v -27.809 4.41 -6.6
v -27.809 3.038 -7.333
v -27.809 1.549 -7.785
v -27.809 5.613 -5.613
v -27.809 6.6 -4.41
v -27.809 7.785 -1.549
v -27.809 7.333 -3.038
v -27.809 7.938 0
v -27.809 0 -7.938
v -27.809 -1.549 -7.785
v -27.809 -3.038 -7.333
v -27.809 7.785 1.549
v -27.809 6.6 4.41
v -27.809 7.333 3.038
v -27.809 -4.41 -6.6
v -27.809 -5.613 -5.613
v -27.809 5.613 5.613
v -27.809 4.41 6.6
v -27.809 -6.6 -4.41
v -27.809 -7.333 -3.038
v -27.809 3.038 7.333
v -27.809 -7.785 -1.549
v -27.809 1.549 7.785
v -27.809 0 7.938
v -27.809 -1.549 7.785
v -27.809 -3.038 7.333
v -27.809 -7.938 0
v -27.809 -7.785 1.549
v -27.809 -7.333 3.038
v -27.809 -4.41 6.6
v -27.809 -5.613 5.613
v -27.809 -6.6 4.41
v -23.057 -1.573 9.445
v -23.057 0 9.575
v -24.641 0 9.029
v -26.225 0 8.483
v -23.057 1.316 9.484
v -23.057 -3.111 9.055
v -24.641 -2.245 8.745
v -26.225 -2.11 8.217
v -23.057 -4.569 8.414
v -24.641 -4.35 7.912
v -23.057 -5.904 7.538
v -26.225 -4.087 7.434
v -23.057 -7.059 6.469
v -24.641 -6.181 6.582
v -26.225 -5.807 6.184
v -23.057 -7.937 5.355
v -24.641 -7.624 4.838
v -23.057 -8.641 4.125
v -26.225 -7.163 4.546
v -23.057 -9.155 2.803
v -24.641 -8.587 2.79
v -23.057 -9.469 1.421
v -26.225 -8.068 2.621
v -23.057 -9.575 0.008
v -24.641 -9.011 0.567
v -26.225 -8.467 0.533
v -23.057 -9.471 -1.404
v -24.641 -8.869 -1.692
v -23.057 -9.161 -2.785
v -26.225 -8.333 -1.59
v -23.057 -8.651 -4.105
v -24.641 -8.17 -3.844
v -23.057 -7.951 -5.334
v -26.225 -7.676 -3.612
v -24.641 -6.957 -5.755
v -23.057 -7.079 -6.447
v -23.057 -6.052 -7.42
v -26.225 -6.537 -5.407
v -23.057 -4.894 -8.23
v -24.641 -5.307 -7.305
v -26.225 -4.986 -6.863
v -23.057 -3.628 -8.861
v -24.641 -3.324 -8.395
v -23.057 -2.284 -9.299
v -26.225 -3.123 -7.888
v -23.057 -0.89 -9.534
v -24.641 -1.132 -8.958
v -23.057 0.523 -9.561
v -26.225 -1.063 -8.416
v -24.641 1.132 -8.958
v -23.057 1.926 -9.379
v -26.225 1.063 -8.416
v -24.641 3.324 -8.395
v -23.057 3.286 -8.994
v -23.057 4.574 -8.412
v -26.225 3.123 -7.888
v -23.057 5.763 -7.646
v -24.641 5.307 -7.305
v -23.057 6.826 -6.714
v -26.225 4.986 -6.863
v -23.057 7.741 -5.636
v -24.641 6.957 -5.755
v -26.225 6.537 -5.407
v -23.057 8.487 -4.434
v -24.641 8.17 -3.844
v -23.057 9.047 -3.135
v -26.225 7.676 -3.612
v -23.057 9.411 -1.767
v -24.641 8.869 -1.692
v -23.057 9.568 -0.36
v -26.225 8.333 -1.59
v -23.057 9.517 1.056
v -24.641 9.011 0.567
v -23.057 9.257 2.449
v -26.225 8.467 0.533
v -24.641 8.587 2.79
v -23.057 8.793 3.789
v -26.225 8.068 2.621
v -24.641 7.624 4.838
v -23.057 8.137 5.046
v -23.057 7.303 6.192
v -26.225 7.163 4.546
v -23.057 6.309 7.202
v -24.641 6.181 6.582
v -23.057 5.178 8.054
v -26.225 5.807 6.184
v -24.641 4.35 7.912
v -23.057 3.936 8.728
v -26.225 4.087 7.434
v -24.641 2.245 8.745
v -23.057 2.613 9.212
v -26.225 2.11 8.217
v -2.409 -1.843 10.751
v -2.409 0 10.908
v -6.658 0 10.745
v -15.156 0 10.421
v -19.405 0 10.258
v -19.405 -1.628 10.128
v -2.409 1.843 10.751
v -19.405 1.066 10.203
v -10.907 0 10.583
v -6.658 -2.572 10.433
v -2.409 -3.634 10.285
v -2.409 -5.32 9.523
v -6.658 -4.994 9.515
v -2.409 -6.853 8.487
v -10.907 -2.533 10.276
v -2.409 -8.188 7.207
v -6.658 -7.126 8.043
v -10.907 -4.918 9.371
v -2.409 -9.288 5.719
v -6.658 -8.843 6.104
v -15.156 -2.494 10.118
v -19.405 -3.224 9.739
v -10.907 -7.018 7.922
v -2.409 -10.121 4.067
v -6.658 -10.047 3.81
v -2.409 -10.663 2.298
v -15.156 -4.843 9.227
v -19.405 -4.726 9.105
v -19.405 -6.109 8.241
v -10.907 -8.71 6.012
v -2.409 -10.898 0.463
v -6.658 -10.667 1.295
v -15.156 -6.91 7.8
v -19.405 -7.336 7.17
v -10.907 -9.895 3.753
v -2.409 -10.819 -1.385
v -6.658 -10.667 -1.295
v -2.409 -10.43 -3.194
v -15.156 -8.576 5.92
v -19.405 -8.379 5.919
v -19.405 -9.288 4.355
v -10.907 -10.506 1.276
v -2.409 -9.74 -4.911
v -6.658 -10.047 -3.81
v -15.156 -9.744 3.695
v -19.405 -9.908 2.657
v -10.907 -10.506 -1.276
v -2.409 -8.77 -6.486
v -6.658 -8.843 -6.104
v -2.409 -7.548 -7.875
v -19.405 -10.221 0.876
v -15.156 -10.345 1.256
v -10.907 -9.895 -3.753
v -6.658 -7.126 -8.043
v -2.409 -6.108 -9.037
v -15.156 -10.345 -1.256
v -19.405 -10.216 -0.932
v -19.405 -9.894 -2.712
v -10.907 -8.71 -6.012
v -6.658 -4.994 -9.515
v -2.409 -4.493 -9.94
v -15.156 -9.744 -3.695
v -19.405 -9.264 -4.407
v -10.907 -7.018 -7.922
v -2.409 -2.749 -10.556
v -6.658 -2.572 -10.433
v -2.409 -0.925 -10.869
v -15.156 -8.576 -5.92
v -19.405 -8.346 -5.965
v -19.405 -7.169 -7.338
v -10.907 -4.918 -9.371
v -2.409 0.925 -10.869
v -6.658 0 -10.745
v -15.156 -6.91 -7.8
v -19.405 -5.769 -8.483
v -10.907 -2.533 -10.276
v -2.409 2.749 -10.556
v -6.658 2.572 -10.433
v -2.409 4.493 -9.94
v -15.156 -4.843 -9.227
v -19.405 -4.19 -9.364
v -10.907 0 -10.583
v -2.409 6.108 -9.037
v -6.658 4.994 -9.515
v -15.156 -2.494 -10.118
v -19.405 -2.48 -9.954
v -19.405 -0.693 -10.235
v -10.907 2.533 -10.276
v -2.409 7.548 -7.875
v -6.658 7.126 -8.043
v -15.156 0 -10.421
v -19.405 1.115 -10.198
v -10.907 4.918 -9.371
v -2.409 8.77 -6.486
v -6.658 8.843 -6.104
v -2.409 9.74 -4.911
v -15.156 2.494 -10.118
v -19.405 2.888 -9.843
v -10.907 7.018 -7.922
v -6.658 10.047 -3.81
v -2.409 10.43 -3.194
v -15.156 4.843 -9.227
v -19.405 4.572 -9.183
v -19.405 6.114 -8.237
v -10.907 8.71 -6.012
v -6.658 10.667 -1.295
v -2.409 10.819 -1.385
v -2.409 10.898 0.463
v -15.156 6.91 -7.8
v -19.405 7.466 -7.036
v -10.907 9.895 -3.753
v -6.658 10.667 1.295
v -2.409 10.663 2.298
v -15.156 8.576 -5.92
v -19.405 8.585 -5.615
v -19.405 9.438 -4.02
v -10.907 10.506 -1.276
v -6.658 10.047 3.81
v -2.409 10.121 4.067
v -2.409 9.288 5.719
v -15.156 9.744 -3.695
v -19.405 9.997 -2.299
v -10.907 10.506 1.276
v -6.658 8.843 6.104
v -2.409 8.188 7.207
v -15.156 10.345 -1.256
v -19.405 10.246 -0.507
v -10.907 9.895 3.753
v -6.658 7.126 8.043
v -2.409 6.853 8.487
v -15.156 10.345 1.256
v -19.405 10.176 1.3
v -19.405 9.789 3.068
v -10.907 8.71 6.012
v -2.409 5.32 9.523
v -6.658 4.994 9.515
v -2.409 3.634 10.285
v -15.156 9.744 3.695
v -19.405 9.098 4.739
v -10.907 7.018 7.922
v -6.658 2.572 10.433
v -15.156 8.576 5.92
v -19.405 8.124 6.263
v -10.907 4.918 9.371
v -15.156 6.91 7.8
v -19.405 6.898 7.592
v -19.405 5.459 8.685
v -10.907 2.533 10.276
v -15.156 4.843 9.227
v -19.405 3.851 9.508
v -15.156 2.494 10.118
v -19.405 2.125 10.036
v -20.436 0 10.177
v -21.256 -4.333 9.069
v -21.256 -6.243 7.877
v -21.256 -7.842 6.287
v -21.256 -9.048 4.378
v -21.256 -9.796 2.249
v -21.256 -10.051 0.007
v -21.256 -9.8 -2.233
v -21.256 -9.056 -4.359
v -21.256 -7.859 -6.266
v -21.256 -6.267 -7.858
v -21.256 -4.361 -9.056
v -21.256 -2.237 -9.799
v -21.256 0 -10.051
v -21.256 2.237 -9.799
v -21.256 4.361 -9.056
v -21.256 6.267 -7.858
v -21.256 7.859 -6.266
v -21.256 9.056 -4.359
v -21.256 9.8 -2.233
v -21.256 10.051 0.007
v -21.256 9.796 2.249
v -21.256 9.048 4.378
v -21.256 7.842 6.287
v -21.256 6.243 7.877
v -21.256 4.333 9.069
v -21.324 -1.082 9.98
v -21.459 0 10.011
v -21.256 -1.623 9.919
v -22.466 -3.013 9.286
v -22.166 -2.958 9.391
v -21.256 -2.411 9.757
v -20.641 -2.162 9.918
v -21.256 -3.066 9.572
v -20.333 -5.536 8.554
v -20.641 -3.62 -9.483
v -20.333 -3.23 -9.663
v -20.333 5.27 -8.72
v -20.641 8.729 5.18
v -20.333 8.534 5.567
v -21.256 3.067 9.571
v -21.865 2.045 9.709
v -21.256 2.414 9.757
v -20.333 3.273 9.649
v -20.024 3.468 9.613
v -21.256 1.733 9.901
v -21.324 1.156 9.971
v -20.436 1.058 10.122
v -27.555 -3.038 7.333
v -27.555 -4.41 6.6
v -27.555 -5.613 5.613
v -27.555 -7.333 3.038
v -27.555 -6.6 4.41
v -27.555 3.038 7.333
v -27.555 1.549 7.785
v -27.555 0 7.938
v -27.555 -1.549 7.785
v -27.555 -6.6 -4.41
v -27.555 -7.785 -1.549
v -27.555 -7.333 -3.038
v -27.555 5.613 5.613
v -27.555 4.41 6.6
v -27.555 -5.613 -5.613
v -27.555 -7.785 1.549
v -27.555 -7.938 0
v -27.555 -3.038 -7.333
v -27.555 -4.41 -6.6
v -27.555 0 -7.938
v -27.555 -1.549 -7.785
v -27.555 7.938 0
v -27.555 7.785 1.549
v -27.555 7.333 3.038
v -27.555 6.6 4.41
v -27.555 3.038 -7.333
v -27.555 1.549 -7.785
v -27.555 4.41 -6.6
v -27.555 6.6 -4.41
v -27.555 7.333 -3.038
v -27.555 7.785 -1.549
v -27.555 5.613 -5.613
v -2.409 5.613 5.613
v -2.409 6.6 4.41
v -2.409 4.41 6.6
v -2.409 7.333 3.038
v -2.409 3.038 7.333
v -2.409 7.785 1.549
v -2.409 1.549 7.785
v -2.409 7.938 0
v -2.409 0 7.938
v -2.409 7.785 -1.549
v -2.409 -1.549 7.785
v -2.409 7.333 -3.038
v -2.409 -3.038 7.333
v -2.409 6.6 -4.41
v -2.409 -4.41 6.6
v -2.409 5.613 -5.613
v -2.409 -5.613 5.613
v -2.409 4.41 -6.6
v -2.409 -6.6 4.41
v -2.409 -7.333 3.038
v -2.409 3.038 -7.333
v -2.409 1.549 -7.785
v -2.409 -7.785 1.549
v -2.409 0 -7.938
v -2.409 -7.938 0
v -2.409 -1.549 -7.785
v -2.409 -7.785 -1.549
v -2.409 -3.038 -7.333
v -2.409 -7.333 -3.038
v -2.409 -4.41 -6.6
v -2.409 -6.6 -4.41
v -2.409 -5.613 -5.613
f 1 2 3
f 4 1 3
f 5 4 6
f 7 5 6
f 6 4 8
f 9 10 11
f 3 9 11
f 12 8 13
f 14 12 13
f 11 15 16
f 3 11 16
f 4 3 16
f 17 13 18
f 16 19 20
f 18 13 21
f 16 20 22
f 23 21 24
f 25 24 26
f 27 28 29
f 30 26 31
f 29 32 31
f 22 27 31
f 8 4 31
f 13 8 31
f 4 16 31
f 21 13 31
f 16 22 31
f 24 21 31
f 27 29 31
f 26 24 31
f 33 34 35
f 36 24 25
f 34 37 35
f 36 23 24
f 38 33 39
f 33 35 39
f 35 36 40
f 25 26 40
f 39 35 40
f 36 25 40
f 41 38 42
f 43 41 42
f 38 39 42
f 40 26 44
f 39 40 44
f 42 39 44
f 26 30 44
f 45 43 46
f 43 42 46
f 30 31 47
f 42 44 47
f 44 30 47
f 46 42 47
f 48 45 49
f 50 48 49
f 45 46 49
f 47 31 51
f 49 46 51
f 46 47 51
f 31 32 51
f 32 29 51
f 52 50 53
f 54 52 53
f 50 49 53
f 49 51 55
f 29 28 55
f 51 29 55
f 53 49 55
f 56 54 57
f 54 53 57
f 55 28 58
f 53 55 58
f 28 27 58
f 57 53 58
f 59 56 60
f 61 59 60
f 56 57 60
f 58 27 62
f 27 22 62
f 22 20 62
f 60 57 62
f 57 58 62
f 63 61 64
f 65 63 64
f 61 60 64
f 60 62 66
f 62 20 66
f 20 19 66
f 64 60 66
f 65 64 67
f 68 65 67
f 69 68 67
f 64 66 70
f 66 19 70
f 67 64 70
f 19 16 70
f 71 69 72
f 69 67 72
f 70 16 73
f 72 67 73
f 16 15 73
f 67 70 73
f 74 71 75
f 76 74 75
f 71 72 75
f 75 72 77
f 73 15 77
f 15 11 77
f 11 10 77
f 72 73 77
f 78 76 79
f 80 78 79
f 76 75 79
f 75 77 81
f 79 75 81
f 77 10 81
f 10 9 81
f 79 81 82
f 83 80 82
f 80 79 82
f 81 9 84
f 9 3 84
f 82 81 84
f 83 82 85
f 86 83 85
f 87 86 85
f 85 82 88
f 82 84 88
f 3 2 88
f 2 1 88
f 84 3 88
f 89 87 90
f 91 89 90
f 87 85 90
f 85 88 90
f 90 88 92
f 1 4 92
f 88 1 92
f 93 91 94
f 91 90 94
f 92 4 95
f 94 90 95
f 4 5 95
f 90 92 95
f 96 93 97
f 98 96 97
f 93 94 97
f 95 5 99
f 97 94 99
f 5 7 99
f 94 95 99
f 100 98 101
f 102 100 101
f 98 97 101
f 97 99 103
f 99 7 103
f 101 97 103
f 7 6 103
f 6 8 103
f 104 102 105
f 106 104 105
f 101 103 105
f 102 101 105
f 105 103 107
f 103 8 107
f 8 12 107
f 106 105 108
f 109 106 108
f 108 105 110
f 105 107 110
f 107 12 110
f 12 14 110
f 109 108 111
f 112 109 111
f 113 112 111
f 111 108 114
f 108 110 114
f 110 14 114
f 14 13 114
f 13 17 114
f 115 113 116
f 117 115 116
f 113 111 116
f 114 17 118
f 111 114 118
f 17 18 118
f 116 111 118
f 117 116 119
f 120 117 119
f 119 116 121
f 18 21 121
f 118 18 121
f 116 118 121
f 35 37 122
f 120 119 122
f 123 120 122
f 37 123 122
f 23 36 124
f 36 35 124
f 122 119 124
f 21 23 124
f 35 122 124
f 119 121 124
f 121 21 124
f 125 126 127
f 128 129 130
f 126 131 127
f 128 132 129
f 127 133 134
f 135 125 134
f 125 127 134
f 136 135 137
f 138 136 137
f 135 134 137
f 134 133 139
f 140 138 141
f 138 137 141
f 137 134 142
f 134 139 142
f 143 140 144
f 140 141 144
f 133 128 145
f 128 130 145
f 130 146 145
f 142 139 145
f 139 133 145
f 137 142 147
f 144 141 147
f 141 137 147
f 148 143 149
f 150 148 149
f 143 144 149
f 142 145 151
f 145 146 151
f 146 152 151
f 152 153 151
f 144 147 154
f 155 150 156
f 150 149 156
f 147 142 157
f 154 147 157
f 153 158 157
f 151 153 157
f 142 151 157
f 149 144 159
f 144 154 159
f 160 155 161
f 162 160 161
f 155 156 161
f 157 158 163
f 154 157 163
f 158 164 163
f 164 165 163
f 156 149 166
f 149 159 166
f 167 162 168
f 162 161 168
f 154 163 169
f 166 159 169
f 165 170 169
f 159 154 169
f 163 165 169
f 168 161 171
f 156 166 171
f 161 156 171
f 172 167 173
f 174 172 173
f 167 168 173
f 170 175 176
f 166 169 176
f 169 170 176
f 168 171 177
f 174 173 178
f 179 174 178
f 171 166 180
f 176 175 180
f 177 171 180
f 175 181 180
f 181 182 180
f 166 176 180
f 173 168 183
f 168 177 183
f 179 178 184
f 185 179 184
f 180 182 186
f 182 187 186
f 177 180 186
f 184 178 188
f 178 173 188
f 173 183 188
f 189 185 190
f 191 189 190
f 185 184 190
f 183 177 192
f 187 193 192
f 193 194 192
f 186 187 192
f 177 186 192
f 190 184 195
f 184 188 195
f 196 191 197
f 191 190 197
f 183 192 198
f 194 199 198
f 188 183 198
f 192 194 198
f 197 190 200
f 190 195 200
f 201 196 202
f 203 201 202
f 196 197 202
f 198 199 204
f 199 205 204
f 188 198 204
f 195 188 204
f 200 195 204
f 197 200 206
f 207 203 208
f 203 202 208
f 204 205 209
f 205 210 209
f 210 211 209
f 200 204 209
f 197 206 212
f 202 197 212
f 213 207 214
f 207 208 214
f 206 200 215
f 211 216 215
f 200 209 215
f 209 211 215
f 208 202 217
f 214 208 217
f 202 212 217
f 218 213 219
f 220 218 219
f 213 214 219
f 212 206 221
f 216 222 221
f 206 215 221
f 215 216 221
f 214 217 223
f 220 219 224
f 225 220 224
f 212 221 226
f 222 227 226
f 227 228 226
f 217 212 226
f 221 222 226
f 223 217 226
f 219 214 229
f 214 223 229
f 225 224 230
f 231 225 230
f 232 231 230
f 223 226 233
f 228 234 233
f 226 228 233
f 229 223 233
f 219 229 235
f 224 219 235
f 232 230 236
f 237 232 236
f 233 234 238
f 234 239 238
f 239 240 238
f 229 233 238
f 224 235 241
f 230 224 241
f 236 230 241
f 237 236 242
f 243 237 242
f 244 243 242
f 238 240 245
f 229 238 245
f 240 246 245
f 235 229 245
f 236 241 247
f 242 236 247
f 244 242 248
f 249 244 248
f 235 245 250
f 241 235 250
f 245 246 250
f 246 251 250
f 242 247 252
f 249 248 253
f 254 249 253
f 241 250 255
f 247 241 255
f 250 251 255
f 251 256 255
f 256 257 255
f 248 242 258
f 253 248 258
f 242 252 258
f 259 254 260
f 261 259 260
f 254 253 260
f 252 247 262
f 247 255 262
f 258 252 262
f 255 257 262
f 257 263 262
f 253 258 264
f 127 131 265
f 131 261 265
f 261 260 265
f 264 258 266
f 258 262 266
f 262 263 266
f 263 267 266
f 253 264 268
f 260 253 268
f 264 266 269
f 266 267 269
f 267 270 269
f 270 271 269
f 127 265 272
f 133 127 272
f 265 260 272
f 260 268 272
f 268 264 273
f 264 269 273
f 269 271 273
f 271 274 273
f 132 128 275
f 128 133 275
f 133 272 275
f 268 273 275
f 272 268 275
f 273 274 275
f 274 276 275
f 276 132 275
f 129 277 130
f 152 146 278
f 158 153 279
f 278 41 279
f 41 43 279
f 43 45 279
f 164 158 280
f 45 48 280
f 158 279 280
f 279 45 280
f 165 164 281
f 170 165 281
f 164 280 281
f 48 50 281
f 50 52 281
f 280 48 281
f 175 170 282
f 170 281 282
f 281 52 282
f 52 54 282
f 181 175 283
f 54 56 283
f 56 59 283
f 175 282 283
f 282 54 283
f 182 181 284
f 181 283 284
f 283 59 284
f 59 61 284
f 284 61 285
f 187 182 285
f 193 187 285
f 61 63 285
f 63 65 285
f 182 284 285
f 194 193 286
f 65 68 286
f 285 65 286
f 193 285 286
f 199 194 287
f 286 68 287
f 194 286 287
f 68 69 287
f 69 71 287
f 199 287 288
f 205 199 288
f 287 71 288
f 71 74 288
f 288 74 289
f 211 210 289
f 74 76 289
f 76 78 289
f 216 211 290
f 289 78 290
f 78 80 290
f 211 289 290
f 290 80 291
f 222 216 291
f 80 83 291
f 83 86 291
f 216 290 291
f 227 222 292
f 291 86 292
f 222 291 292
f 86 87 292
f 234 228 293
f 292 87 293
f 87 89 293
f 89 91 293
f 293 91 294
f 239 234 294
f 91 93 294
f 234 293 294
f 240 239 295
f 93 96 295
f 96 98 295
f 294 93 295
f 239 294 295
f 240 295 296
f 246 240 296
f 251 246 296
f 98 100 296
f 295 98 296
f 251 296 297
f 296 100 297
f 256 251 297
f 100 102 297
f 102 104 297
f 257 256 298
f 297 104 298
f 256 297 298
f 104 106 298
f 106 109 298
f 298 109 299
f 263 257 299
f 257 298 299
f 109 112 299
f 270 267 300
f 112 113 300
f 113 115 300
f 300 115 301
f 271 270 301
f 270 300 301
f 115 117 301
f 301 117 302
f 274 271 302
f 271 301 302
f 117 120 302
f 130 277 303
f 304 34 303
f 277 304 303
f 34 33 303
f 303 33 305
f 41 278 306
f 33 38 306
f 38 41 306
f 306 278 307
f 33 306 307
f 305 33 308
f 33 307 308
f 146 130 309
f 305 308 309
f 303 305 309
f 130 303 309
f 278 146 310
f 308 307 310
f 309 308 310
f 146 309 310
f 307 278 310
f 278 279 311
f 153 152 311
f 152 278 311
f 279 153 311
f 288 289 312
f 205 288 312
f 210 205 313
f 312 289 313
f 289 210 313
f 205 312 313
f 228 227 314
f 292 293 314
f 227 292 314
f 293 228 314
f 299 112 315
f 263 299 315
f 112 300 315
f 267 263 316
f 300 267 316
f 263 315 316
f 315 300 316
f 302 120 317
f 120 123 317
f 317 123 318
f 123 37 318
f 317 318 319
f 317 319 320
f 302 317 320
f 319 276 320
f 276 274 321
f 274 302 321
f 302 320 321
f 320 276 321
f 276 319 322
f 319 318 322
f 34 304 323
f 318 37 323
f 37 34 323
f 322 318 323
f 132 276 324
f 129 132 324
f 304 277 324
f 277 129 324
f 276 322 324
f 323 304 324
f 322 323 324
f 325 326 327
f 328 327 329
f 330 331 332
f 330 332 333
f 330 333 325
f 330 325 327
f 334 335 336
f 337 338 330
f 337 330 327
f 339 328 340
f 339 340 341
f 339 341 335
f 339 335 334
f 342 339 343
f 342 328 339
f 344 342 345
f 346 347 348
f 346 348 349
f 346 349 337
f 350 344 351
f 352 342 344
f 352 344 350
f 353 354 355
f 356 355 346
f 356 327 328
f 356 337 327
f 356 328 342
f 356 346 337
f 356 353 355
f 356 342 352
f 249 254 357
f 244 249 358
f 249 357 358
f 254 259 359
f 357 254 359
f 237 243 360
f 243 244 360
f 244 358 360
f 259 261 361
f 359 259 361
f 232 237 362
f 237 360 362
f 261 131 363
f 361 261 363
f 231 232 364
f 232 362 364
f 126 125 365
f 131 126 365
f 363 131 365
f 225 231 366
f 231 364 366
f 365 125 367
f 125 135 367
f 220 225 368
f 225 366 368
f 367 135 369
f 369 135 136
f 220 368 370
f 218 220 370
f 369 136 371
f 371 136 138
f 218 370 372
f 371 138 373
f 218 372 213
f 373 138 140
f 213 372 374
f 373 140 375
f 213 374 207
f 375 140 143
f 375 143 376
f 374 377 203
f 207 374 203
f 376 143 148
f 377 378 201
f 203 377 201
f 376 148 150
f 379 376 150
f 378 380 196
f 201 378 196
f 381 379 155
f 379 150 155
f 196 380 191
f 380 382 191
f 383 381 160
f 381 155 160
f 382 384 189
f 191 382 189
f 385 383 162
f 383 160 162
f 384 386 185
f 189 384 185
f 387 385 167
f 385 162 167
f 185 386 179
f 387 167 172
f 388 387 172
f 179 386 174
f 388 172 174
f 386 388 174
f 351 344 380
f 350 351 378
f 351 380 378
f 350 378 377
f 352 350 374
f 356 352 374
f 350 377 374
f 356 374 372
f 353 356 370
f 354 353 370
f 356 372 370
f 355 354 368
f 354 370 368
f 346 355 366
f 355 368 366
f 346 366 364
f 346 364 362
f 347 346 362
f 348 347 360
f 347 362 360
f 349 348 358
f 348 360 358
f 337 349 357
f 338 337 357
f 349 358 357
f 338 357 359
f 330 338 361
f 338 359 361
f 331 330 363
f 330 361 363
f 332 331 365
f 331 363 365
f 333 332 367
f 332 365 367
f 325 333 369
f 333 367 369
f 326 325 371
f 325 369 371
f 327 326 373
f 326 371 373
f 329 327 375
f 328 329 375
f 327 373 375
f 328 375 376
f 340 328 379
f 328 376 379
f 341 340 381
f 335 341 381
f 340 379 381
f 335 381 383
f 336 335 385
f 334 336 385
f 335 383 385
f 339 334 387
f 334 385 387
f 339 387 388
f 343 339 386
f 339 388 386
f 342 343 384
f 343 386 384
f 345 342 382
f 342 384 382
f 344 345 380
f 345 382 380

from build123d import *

# Parameters (mm, degrees)
SKETCH3_R          = 7.9375
CUT_EXTRUDE1_DEPTH = 25.146
FILLET1_R          = 12.7


with BuildPart() as part:
    # Sketch2 → Revolve1 (revolve)
    with BuildSketch(Plane.XY, mode=Mode.PRIVATE) as revolve1_sk:
        Polygon((-27.809498475, 7.9375), (-27.809498475, 0), (-2.409498475, 0), (-2.409498475, 10.907816429), (-21.2812055, 10.186700377), align=None)
    revolve(revolve1_sk.sketch.rotate(Axis((-27.809498475, 0, 0), (1, 0, 0)), 90), axis=Axis((-27.809498475, 0, 0), (1, 0, 0)))

    # Sketch3 → Cut-Extrude1 (cut)
    with BuildSketch(Plane(origin=(-2.409498475, 0, 0), x_dir=(0, 0, -1), z_dir=(1, 0, 0))):
        Circle(SKETCH3_R)
    extrude(amount=-CUT_EXTRUDE1_DEPTH, mode=Mode.SUBTRACT)

    # Fillet1
    fillet1_edges = [part.edges().sort_by_distance(p)[0] for p in [
        (-21.2812055, 0, -10.186700377),
    ]]
    fillet(fillet1_edges, radius=FILLET1_R)


solid = part.part
